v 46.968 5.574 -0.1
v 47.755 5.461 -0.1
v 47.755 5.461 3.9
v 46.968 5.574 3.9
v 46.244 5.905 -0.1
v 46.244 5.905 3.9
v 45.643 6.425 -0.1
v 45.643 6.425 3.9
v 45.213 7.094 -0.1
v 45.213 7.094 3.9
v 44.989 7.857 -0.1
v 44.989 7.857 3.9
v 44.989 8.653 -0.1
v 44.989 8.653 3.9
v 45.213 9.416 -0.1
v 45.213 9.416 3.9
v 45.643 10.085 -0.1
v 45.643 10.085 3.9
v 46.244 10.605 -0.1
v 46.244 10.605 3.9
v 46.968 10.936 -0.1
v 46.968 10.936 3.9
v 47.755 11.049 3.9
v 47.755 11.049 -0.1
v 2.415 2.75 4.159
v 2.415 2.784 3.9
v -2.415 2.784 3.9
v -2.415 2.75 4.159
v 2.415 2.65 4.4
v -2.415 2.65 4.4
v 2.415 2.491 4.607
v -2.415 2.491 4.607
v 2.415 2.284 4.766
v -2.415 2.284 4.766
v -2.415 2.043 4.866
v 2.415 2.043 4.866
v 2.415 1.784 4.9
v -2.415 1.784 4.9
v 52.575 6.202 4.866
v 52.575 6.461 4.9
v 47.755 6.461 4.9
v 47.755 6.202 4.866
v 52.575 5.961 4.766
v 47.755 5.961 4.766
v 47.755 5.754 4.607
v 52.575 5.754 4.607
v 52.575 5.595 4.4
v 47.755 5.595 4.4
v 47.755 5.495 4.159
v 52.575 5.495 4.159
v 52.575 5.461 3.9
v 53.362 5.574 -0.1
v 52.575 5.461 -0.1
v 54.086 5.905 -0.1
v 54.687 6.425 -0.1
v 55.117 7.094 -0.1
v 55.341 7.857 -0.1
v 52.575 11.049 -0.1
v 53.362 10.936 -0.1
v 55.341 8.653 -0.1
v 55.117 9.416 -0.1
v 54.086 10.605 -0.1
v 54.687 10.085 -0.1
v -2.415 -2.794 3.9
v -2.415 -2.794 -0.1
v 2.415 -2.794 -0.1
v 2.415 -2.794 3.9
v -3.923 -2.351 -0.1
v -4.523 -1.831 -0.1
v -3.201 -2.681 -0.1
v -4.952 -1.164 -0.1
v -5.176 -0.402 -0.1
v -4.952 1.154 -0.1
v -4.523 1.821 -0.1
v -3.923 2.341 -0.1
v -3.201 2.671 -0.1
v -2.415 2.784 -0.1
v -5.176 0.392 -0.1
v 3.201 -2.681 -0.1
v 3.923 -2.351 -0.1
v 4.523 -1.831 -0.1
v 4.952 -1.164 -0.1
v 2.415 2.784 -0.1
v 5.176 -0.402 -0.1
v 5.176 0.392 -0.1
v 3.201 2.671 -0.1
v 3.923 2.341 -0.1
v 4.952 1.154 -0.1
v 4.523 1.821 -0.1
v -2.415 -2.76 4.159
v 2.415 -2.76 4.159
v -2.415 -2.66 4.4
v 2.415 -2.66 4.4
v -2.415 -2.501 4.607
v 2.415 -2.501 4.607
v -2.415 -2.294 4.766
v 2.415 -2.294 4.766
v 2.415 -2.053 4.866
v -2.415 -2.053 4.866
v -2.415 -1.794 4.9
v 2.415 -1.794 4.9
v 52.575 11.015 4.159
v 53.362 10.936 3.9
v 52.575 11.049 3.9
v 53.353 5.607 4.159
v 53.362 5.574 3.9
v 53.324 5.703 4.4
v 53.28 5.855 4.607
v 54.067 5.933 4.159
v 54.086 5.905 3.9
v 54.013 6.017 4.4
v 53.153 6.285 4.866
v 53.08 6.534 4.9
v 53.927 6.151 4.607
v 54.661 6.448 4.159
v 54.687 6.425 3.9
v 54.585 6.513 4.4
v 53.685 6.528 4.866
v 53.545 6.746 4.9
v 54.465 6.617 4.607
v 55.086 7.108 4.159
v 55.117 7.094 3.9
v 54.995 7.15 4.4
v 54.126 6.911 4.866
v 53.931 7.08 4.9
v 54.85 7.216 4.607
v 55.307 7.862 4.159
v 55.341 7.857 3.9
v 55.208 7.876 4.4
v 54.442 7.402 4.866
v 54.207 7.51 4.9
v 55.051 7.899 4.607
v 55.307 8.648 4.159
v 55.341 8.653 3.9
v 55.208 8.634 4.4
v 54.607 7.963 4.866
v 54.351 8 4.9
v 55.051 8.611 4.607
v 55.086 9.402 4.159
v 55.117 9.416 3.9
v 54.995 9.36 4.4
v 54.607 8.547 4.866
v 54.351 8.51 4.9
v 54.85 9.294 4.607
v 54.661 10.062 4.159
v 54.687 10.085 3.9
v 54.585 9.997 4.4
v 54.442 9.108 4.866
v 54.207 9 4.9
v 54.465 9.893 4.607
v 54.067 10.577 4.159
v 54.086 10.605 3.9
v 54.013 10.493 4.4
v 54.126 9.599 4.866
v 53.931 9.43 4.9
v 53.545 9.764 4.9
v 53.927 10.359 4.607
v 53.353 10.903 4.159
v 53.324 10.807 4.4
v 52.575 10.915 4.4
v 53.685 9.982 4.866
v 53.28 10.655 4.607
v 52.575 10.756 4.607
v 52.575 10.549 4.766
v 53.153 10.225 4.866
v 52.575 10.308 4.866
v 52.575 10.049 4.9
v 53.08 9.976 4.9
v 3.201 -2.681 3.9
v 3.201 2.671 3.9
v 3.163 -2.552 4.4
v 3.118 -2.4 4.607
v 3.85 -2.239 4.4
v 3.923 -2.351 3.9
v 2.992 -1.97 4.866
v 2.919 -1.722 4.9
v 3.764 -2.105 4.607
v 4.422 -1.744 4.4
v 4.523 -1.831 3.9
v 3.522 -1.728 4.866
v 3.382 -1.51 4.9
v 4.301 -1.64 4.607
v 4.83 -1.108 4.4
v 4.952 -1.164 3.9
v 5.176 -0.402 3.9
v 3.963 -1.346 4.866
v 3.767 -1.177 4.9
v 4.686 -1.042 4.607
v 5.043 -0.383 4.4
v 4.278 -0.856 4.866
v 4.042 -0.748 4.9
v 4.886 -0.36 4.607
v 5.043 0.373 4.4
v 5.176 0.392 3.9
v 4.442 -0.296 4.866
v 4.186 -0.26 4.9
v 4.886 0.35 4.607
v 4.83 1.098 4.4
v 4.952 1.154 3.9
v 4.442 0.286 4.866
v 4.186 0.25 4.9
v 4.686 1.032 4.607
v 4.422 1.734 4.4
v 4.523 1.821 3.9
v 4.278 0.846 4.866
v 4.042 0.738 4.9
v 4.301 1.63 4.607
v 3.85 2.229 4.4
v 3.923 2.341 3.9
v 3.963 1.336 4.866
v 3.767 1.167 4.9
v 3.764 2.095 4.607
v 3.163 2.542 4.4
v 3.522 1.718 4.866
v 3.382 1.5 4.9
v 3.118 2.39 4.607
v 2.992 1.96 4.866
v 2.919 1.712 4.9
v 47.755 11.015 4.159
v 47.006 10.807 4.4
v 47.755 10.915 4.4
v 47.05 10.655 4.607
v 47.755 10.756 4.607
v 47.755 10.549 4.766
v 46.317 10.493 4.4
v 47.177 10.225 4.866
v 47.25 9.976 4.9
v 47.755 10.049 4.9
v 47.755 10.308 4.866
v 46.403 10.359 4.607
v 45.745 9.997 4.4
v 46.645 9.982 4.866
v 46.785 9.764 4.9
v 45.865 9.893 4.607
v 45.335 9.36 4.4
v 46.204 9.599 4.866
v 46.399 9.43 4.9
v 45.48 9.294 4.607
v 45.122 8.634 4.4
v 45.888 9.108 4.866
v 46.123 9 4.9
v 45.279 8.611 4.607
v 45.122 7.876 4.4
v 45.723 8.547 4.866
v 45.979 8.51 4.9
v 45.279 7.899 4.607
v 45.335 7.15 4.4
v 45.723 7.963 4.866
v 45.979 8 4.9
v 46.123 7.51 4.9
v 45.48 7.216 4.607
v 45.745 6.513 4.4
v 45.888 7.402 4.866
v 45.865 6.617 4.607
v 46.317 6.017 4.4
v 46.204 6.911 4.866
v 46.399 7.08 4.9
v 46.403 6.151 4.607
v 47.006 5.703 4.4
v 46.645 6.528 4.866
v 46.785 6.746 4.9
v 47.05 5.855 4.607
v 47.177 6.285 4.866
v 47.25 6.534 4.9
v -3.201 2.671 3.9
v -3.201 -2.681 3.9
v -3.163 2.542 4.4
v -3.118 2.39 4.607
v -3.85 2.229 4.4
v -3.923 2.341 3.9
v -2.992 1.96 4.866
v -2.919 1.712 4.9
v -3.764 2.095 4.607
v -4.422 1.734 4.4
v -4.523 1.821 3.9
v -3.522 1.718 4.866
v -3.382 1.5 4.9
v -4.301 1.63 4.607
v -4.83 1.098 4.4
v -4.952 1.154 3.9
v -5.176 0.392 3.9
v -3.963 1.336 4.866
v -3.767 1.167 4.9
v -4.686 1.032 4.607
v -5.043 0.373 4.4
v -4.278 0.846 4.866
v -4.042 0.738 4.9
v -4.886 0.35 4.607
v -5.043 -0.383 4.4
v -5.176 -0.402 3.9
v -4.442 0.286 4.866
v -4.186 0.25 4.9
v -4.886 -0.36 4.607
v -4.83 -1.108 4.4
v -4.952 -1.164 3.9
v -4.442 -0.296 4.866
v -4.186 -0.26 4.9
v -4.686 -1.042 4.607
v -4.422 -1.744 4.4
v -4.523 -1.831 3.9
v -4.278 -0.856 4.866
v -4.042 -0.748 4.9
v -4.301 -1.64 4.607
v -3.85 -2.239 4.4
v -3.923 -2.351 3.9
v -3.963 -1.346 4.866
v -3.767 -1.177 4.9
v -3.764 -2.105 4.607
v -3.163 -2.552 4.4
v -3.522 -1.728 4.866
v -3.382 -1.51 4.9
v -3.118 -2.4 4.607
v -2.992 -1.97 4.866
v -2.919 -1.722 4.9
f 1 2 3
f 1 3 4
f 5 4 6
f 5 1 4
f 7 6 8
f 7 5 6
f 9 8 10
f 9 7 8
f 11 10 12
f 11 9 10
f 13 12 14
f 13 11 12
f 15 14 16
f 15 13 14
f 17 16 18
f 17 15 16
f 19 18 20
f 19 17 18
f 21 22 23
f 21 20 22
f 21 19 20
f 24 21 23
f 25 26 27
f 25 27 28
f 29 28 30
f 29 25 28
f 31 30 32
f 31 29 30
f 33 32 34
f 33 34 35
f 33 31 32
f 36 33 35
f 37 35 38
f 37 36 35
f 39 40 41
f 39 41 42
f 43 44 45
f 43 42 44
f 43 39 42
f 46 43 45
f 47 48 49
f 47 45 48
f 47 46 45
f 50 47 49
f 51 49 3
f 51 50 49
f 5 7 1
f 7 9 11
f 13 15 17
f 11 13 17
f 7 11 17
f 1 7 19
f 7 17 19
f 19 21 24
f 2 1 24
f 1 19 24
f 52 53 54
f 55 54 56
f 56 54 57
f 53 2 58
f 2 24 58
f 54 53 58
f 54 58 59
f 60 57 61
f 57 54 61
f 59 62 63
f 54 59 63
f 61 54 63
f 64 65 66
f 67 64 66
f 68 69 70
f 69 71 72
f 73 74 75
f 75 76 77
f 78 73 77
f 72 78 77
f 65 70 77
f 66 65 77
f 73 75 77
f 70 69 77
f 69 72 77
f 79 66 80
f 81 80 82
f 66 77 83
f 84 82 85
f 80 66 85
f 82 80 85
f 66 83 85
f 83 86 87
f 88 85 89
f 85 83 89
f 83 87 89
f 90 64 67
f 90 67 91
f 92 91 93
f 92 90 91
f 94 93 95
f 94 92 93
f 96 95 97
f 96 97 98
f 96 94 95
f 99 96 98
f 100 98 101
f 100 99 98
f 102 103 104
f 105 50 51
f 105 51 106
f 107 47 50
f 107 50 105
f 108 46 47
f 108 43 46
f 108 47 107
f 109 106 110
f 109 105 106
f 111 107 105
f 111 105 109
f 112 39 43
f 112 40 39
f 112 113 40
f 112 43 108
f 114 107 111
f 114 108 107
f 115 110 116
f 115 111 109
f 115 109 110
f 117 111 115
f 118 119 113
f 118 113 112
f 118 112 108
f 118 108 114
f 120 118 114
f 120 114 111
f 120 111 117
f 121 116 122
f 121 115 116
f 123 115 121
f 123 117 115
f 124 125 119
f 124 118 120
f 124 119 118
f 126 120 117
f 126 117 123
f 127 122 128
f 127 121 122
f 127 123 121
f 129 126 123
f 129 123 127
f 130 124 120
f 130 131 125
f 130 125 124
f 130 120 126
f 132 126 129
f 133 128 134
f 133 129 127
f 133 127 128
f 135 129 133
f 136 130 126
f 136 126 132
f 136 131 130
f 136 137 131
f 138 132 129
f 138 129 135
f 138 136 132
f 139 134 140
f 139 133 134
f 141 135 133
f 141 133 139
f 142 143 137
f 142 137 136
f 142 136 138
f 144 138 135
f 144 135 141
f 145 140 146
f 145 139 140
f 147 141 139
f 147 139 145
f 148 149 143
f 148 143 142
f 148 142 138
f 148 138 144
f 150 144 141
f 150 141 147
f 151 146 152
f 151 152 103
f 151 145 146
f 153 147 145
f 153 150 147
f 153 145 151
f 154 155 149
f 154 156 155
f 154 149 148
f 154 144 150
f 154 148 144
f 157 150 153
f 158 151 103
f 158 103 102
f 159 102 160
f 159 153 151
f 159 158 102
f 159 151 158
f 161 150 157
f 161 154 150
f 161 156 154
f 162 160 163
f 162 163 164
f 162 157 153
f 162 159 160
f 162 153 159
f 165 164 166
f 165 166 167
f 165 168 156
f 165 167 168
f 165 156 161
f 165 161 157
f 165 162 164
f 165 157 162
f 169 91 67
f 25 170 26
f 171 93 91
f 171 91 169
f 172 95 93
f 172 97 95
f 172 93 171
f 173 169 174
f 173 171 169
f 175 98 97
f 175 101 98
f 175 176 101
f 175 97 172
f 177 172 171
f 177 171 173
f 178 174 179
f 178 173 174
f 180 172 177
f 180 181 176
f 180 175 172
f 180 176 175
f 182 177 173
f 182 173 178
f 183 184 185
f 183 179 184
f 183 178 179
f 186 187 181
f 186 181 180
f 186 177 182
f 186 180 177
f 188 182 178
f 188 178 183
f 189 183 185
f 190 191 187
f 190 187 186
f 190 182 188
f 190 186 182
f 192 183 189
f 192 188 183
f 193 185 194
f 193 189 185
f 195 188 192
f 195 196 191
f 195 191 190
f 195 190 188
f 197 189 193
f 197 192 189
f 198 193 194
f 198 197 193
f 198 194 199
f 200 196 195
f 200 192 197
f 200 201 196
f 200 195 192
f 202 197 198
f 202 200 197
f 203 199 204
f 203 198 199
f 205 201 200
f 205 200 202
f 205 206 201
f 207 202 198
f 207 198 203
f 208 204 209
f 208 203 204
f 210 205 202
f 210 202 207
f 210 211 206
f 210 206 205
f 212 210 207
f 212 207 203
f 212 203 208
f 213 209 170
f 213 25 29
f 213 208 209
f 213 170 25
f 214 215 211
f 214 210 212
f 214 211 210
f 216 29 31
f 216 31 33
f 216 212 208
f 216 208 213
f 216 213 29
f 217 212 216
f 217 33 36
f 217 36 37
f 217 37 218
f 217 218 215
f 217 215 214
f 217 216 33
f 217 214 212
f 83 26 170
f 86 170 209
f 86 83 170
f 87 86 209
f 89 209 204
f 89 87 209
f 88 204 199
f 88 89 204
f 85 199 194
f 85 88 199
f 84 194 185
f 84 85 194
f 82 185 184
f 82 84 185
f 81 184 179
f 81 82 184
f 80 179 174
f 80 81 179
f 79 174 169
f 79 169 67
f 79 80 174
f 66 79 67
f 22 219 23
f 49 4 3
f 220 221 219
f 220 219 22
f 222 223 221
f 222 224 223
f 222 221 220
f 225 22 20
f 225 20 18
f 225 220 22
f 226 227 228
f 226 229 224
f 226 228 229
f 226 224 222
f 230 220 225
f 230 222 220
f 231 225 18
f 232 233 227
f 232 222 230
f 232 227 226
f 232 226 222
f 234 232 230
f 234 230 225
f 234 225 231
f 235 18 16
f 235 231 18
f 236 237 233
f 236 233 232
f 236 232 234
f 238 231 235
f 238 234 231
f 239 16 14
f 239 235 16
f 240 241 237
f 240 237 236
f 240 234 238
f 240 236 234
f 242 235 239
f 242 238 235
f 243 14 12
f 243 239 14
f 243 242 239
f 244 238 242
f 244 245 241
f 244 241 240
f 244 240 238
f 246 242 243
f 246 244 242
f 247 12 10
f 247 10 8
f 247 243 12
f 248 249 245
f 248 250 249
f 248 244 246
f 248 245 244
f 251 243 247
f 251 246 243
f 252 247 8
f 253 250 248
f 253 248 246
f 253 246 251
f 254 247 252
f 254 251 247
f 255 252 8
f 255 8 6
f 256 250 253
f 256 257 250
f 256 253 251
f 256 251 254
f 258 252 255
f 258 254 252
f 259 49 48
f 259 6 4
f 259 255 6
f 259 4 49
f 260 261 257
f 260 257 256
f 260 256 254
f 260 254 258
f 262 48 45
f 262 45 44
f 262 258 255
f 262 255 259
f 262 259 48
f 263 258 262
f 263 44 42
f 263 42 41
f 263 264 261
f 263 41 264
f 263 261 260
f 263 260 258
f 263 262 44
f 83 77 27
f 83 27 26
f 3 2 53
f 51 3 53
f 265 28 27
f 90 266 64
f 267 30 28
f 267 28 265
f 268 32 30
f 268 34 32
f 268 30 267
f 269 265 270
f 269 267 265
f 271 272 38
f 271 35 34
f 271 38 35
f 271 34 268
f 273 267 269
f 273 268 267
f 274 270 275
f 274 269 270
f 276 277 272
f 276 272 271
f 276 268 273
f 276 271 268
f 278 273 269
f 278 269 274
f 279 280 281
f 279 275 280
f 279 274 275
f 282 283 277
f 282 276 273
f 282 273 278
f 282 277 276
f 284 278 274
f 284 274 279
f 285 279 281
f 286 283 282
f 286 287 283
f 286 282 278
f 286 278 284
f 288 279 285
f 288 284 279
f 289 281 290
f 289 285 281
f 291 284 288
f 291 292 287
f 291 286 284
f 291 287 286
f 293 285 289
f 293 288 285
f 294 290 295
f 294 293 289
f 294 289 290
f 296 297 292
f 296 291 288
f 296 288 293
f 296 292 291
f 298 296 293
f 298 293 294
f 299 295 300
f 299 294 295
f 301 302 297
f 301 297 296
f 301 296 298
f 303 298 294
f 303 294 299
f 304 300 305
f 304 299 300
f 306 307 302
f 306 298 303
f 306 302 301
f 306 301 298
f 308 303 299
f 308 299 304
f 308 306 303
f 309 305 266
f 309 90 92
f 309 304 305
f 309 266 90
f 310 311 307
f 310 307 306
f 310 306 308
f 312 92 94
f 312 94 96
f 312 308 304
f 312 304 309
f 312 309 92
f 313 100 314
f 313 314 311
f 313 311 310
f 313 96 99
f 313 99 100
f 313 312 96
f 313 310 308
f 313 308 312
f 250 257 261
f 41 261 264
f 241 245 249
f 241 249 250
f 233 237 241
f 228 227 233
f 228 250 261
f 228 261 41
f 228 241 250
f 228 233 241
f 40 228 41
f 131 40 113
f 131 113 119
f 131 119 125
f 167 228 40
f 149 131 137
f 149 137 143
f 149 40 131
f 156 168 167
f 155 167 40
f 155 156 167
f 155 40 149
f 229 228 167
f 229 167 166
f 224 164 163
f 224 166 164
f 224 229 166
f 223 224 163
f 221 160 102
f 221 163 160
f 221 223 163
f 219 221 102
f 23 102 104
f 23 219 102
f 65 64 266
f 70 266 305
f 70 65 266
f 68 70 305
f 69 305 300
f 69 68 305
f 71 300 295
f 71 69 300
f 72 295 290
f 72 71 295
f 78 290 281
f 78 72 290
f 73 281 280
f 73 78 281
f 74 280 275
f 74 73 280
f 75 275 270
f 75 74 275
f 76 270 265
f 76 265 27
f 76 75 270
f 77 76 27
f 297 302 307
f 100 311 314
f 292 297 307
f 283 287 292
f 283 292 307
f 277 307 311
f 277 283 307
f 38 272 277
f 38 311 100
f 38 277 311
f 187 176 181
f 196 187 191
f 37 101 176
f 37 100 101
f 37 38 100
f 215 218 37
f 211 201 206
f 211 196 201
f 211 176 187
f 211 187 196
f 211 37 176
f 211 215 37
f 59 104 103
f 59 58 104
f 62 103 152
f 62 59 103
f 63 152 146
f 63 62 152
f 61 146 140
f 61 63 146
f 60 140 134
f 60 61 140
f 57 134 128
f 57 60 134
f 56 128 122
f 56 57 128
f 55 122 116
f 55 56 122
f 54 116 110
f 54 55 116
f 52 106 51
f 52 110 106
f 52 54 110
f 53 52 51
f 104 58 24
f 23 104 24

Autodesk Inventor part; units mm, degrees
ref_plane "YZ Plane" through (0, 0, 0) normal (1, 0, 0) x (0, 1, 0)
ref_plane "XZ Plane" through (0, 0, 0) normal (0, 1, 0) x (-1, 0, 0)
ref_plane "XY Plane" through (0, 0, 0) normal (0, 0, 1) x (1, 0, 0)
ref_plane "Work Plane1" through (27.775, 29.205, -0.1) normal (0, 0, 1) x (1, 0, 0)
sketch "Sketch1" plane through (27.775, 29.205, -0.1) normal (0, 0, 1) x (1, 0, 0)
  circle A0 centre (-30.19, -29.21) radius 0.405 projected
  circle A1 centre (-25.36, -29.21) radius 0.405 projected
  line L0 (-22.187, -26.411) -> (-33.363, -26.411) projected
  line L1 (-33.363, -26.411) -> (-33.363, -31.999) projected
  line L2 (-33.363, -31.999) -> (-22.187, -31.999) projected
  line L3 (-22.187, -31.999) -> (-22.187, -26.411) projected
  circle A2 centre (19.98, -20.95) radius 0.405 projected
  circle A3 centre (24.8, -20.95) radius 0.405 projected
  line L4 (16.802, -23.744) -> (27.978, -23.744) projected
  line L5 (27.978, -23.744) -> (27.978, -18.156) projected
  line L6 (27.978, -18.156) -> (16.802, -18.156) projected
  line L7 (16.802, -18.156) -> (16.802, -23.744) projected
  line L8 (-30.19, -29.21) -> (-25.36, -29.21) construction
  line L9 (-30.19, -26.421) -> (-25.36, -26.421)
  line L10 (-25.36, -31.999) -> (-30.19, -31.999)
  arc A4 (-30.19, -26.421) -> (-30.19, -31.999) centre (-30.19, -29.21) ccw
  arc A5 (-25.36, -31.999) -> (-25.36, -26.421) centre (-25.36, -29.21) ccw
  line L11 (19.98, -20.95) -> (24.8, -20.95) construction
  line L12 (19.98, -18.156) -> (24.8, -18.156)
  line L13 (24.8, -23.744) -> (19.98, -23.744)
  arc A6 (19.98, -18.156) -> (19.98, -23.744) centre (19.98, -20.95) ccw
  arc A7 (24.8, -23.744) -> (24.8, -18.156) centre (24.8, -20.95) ccw
  point P0 (-27.775, -29.205)
  point P1 (-27.775, -29.21)
  point P2 (22.39, -20.95)
extrude "Extrusion1" add sketch "Sketch1" along normal blind 5 contours A0 | A1 | L2 A4 L9 A5 | A2 | A3 | A6 L6 A7 L4
fillet "Fillet1" radius 1 8 edges at (0, 2.784, 4.9) (-5.204, -0.005, 4.9) (0, -2.794, 4.9) (5.204, -0.005, 4.9) (50.165, 11.049, 4.9) (44.961, 8.255, 4.9) (50.165, 5.461, 4.9) (55.369, 8.255, 4.9)
properties part number "crystals"
